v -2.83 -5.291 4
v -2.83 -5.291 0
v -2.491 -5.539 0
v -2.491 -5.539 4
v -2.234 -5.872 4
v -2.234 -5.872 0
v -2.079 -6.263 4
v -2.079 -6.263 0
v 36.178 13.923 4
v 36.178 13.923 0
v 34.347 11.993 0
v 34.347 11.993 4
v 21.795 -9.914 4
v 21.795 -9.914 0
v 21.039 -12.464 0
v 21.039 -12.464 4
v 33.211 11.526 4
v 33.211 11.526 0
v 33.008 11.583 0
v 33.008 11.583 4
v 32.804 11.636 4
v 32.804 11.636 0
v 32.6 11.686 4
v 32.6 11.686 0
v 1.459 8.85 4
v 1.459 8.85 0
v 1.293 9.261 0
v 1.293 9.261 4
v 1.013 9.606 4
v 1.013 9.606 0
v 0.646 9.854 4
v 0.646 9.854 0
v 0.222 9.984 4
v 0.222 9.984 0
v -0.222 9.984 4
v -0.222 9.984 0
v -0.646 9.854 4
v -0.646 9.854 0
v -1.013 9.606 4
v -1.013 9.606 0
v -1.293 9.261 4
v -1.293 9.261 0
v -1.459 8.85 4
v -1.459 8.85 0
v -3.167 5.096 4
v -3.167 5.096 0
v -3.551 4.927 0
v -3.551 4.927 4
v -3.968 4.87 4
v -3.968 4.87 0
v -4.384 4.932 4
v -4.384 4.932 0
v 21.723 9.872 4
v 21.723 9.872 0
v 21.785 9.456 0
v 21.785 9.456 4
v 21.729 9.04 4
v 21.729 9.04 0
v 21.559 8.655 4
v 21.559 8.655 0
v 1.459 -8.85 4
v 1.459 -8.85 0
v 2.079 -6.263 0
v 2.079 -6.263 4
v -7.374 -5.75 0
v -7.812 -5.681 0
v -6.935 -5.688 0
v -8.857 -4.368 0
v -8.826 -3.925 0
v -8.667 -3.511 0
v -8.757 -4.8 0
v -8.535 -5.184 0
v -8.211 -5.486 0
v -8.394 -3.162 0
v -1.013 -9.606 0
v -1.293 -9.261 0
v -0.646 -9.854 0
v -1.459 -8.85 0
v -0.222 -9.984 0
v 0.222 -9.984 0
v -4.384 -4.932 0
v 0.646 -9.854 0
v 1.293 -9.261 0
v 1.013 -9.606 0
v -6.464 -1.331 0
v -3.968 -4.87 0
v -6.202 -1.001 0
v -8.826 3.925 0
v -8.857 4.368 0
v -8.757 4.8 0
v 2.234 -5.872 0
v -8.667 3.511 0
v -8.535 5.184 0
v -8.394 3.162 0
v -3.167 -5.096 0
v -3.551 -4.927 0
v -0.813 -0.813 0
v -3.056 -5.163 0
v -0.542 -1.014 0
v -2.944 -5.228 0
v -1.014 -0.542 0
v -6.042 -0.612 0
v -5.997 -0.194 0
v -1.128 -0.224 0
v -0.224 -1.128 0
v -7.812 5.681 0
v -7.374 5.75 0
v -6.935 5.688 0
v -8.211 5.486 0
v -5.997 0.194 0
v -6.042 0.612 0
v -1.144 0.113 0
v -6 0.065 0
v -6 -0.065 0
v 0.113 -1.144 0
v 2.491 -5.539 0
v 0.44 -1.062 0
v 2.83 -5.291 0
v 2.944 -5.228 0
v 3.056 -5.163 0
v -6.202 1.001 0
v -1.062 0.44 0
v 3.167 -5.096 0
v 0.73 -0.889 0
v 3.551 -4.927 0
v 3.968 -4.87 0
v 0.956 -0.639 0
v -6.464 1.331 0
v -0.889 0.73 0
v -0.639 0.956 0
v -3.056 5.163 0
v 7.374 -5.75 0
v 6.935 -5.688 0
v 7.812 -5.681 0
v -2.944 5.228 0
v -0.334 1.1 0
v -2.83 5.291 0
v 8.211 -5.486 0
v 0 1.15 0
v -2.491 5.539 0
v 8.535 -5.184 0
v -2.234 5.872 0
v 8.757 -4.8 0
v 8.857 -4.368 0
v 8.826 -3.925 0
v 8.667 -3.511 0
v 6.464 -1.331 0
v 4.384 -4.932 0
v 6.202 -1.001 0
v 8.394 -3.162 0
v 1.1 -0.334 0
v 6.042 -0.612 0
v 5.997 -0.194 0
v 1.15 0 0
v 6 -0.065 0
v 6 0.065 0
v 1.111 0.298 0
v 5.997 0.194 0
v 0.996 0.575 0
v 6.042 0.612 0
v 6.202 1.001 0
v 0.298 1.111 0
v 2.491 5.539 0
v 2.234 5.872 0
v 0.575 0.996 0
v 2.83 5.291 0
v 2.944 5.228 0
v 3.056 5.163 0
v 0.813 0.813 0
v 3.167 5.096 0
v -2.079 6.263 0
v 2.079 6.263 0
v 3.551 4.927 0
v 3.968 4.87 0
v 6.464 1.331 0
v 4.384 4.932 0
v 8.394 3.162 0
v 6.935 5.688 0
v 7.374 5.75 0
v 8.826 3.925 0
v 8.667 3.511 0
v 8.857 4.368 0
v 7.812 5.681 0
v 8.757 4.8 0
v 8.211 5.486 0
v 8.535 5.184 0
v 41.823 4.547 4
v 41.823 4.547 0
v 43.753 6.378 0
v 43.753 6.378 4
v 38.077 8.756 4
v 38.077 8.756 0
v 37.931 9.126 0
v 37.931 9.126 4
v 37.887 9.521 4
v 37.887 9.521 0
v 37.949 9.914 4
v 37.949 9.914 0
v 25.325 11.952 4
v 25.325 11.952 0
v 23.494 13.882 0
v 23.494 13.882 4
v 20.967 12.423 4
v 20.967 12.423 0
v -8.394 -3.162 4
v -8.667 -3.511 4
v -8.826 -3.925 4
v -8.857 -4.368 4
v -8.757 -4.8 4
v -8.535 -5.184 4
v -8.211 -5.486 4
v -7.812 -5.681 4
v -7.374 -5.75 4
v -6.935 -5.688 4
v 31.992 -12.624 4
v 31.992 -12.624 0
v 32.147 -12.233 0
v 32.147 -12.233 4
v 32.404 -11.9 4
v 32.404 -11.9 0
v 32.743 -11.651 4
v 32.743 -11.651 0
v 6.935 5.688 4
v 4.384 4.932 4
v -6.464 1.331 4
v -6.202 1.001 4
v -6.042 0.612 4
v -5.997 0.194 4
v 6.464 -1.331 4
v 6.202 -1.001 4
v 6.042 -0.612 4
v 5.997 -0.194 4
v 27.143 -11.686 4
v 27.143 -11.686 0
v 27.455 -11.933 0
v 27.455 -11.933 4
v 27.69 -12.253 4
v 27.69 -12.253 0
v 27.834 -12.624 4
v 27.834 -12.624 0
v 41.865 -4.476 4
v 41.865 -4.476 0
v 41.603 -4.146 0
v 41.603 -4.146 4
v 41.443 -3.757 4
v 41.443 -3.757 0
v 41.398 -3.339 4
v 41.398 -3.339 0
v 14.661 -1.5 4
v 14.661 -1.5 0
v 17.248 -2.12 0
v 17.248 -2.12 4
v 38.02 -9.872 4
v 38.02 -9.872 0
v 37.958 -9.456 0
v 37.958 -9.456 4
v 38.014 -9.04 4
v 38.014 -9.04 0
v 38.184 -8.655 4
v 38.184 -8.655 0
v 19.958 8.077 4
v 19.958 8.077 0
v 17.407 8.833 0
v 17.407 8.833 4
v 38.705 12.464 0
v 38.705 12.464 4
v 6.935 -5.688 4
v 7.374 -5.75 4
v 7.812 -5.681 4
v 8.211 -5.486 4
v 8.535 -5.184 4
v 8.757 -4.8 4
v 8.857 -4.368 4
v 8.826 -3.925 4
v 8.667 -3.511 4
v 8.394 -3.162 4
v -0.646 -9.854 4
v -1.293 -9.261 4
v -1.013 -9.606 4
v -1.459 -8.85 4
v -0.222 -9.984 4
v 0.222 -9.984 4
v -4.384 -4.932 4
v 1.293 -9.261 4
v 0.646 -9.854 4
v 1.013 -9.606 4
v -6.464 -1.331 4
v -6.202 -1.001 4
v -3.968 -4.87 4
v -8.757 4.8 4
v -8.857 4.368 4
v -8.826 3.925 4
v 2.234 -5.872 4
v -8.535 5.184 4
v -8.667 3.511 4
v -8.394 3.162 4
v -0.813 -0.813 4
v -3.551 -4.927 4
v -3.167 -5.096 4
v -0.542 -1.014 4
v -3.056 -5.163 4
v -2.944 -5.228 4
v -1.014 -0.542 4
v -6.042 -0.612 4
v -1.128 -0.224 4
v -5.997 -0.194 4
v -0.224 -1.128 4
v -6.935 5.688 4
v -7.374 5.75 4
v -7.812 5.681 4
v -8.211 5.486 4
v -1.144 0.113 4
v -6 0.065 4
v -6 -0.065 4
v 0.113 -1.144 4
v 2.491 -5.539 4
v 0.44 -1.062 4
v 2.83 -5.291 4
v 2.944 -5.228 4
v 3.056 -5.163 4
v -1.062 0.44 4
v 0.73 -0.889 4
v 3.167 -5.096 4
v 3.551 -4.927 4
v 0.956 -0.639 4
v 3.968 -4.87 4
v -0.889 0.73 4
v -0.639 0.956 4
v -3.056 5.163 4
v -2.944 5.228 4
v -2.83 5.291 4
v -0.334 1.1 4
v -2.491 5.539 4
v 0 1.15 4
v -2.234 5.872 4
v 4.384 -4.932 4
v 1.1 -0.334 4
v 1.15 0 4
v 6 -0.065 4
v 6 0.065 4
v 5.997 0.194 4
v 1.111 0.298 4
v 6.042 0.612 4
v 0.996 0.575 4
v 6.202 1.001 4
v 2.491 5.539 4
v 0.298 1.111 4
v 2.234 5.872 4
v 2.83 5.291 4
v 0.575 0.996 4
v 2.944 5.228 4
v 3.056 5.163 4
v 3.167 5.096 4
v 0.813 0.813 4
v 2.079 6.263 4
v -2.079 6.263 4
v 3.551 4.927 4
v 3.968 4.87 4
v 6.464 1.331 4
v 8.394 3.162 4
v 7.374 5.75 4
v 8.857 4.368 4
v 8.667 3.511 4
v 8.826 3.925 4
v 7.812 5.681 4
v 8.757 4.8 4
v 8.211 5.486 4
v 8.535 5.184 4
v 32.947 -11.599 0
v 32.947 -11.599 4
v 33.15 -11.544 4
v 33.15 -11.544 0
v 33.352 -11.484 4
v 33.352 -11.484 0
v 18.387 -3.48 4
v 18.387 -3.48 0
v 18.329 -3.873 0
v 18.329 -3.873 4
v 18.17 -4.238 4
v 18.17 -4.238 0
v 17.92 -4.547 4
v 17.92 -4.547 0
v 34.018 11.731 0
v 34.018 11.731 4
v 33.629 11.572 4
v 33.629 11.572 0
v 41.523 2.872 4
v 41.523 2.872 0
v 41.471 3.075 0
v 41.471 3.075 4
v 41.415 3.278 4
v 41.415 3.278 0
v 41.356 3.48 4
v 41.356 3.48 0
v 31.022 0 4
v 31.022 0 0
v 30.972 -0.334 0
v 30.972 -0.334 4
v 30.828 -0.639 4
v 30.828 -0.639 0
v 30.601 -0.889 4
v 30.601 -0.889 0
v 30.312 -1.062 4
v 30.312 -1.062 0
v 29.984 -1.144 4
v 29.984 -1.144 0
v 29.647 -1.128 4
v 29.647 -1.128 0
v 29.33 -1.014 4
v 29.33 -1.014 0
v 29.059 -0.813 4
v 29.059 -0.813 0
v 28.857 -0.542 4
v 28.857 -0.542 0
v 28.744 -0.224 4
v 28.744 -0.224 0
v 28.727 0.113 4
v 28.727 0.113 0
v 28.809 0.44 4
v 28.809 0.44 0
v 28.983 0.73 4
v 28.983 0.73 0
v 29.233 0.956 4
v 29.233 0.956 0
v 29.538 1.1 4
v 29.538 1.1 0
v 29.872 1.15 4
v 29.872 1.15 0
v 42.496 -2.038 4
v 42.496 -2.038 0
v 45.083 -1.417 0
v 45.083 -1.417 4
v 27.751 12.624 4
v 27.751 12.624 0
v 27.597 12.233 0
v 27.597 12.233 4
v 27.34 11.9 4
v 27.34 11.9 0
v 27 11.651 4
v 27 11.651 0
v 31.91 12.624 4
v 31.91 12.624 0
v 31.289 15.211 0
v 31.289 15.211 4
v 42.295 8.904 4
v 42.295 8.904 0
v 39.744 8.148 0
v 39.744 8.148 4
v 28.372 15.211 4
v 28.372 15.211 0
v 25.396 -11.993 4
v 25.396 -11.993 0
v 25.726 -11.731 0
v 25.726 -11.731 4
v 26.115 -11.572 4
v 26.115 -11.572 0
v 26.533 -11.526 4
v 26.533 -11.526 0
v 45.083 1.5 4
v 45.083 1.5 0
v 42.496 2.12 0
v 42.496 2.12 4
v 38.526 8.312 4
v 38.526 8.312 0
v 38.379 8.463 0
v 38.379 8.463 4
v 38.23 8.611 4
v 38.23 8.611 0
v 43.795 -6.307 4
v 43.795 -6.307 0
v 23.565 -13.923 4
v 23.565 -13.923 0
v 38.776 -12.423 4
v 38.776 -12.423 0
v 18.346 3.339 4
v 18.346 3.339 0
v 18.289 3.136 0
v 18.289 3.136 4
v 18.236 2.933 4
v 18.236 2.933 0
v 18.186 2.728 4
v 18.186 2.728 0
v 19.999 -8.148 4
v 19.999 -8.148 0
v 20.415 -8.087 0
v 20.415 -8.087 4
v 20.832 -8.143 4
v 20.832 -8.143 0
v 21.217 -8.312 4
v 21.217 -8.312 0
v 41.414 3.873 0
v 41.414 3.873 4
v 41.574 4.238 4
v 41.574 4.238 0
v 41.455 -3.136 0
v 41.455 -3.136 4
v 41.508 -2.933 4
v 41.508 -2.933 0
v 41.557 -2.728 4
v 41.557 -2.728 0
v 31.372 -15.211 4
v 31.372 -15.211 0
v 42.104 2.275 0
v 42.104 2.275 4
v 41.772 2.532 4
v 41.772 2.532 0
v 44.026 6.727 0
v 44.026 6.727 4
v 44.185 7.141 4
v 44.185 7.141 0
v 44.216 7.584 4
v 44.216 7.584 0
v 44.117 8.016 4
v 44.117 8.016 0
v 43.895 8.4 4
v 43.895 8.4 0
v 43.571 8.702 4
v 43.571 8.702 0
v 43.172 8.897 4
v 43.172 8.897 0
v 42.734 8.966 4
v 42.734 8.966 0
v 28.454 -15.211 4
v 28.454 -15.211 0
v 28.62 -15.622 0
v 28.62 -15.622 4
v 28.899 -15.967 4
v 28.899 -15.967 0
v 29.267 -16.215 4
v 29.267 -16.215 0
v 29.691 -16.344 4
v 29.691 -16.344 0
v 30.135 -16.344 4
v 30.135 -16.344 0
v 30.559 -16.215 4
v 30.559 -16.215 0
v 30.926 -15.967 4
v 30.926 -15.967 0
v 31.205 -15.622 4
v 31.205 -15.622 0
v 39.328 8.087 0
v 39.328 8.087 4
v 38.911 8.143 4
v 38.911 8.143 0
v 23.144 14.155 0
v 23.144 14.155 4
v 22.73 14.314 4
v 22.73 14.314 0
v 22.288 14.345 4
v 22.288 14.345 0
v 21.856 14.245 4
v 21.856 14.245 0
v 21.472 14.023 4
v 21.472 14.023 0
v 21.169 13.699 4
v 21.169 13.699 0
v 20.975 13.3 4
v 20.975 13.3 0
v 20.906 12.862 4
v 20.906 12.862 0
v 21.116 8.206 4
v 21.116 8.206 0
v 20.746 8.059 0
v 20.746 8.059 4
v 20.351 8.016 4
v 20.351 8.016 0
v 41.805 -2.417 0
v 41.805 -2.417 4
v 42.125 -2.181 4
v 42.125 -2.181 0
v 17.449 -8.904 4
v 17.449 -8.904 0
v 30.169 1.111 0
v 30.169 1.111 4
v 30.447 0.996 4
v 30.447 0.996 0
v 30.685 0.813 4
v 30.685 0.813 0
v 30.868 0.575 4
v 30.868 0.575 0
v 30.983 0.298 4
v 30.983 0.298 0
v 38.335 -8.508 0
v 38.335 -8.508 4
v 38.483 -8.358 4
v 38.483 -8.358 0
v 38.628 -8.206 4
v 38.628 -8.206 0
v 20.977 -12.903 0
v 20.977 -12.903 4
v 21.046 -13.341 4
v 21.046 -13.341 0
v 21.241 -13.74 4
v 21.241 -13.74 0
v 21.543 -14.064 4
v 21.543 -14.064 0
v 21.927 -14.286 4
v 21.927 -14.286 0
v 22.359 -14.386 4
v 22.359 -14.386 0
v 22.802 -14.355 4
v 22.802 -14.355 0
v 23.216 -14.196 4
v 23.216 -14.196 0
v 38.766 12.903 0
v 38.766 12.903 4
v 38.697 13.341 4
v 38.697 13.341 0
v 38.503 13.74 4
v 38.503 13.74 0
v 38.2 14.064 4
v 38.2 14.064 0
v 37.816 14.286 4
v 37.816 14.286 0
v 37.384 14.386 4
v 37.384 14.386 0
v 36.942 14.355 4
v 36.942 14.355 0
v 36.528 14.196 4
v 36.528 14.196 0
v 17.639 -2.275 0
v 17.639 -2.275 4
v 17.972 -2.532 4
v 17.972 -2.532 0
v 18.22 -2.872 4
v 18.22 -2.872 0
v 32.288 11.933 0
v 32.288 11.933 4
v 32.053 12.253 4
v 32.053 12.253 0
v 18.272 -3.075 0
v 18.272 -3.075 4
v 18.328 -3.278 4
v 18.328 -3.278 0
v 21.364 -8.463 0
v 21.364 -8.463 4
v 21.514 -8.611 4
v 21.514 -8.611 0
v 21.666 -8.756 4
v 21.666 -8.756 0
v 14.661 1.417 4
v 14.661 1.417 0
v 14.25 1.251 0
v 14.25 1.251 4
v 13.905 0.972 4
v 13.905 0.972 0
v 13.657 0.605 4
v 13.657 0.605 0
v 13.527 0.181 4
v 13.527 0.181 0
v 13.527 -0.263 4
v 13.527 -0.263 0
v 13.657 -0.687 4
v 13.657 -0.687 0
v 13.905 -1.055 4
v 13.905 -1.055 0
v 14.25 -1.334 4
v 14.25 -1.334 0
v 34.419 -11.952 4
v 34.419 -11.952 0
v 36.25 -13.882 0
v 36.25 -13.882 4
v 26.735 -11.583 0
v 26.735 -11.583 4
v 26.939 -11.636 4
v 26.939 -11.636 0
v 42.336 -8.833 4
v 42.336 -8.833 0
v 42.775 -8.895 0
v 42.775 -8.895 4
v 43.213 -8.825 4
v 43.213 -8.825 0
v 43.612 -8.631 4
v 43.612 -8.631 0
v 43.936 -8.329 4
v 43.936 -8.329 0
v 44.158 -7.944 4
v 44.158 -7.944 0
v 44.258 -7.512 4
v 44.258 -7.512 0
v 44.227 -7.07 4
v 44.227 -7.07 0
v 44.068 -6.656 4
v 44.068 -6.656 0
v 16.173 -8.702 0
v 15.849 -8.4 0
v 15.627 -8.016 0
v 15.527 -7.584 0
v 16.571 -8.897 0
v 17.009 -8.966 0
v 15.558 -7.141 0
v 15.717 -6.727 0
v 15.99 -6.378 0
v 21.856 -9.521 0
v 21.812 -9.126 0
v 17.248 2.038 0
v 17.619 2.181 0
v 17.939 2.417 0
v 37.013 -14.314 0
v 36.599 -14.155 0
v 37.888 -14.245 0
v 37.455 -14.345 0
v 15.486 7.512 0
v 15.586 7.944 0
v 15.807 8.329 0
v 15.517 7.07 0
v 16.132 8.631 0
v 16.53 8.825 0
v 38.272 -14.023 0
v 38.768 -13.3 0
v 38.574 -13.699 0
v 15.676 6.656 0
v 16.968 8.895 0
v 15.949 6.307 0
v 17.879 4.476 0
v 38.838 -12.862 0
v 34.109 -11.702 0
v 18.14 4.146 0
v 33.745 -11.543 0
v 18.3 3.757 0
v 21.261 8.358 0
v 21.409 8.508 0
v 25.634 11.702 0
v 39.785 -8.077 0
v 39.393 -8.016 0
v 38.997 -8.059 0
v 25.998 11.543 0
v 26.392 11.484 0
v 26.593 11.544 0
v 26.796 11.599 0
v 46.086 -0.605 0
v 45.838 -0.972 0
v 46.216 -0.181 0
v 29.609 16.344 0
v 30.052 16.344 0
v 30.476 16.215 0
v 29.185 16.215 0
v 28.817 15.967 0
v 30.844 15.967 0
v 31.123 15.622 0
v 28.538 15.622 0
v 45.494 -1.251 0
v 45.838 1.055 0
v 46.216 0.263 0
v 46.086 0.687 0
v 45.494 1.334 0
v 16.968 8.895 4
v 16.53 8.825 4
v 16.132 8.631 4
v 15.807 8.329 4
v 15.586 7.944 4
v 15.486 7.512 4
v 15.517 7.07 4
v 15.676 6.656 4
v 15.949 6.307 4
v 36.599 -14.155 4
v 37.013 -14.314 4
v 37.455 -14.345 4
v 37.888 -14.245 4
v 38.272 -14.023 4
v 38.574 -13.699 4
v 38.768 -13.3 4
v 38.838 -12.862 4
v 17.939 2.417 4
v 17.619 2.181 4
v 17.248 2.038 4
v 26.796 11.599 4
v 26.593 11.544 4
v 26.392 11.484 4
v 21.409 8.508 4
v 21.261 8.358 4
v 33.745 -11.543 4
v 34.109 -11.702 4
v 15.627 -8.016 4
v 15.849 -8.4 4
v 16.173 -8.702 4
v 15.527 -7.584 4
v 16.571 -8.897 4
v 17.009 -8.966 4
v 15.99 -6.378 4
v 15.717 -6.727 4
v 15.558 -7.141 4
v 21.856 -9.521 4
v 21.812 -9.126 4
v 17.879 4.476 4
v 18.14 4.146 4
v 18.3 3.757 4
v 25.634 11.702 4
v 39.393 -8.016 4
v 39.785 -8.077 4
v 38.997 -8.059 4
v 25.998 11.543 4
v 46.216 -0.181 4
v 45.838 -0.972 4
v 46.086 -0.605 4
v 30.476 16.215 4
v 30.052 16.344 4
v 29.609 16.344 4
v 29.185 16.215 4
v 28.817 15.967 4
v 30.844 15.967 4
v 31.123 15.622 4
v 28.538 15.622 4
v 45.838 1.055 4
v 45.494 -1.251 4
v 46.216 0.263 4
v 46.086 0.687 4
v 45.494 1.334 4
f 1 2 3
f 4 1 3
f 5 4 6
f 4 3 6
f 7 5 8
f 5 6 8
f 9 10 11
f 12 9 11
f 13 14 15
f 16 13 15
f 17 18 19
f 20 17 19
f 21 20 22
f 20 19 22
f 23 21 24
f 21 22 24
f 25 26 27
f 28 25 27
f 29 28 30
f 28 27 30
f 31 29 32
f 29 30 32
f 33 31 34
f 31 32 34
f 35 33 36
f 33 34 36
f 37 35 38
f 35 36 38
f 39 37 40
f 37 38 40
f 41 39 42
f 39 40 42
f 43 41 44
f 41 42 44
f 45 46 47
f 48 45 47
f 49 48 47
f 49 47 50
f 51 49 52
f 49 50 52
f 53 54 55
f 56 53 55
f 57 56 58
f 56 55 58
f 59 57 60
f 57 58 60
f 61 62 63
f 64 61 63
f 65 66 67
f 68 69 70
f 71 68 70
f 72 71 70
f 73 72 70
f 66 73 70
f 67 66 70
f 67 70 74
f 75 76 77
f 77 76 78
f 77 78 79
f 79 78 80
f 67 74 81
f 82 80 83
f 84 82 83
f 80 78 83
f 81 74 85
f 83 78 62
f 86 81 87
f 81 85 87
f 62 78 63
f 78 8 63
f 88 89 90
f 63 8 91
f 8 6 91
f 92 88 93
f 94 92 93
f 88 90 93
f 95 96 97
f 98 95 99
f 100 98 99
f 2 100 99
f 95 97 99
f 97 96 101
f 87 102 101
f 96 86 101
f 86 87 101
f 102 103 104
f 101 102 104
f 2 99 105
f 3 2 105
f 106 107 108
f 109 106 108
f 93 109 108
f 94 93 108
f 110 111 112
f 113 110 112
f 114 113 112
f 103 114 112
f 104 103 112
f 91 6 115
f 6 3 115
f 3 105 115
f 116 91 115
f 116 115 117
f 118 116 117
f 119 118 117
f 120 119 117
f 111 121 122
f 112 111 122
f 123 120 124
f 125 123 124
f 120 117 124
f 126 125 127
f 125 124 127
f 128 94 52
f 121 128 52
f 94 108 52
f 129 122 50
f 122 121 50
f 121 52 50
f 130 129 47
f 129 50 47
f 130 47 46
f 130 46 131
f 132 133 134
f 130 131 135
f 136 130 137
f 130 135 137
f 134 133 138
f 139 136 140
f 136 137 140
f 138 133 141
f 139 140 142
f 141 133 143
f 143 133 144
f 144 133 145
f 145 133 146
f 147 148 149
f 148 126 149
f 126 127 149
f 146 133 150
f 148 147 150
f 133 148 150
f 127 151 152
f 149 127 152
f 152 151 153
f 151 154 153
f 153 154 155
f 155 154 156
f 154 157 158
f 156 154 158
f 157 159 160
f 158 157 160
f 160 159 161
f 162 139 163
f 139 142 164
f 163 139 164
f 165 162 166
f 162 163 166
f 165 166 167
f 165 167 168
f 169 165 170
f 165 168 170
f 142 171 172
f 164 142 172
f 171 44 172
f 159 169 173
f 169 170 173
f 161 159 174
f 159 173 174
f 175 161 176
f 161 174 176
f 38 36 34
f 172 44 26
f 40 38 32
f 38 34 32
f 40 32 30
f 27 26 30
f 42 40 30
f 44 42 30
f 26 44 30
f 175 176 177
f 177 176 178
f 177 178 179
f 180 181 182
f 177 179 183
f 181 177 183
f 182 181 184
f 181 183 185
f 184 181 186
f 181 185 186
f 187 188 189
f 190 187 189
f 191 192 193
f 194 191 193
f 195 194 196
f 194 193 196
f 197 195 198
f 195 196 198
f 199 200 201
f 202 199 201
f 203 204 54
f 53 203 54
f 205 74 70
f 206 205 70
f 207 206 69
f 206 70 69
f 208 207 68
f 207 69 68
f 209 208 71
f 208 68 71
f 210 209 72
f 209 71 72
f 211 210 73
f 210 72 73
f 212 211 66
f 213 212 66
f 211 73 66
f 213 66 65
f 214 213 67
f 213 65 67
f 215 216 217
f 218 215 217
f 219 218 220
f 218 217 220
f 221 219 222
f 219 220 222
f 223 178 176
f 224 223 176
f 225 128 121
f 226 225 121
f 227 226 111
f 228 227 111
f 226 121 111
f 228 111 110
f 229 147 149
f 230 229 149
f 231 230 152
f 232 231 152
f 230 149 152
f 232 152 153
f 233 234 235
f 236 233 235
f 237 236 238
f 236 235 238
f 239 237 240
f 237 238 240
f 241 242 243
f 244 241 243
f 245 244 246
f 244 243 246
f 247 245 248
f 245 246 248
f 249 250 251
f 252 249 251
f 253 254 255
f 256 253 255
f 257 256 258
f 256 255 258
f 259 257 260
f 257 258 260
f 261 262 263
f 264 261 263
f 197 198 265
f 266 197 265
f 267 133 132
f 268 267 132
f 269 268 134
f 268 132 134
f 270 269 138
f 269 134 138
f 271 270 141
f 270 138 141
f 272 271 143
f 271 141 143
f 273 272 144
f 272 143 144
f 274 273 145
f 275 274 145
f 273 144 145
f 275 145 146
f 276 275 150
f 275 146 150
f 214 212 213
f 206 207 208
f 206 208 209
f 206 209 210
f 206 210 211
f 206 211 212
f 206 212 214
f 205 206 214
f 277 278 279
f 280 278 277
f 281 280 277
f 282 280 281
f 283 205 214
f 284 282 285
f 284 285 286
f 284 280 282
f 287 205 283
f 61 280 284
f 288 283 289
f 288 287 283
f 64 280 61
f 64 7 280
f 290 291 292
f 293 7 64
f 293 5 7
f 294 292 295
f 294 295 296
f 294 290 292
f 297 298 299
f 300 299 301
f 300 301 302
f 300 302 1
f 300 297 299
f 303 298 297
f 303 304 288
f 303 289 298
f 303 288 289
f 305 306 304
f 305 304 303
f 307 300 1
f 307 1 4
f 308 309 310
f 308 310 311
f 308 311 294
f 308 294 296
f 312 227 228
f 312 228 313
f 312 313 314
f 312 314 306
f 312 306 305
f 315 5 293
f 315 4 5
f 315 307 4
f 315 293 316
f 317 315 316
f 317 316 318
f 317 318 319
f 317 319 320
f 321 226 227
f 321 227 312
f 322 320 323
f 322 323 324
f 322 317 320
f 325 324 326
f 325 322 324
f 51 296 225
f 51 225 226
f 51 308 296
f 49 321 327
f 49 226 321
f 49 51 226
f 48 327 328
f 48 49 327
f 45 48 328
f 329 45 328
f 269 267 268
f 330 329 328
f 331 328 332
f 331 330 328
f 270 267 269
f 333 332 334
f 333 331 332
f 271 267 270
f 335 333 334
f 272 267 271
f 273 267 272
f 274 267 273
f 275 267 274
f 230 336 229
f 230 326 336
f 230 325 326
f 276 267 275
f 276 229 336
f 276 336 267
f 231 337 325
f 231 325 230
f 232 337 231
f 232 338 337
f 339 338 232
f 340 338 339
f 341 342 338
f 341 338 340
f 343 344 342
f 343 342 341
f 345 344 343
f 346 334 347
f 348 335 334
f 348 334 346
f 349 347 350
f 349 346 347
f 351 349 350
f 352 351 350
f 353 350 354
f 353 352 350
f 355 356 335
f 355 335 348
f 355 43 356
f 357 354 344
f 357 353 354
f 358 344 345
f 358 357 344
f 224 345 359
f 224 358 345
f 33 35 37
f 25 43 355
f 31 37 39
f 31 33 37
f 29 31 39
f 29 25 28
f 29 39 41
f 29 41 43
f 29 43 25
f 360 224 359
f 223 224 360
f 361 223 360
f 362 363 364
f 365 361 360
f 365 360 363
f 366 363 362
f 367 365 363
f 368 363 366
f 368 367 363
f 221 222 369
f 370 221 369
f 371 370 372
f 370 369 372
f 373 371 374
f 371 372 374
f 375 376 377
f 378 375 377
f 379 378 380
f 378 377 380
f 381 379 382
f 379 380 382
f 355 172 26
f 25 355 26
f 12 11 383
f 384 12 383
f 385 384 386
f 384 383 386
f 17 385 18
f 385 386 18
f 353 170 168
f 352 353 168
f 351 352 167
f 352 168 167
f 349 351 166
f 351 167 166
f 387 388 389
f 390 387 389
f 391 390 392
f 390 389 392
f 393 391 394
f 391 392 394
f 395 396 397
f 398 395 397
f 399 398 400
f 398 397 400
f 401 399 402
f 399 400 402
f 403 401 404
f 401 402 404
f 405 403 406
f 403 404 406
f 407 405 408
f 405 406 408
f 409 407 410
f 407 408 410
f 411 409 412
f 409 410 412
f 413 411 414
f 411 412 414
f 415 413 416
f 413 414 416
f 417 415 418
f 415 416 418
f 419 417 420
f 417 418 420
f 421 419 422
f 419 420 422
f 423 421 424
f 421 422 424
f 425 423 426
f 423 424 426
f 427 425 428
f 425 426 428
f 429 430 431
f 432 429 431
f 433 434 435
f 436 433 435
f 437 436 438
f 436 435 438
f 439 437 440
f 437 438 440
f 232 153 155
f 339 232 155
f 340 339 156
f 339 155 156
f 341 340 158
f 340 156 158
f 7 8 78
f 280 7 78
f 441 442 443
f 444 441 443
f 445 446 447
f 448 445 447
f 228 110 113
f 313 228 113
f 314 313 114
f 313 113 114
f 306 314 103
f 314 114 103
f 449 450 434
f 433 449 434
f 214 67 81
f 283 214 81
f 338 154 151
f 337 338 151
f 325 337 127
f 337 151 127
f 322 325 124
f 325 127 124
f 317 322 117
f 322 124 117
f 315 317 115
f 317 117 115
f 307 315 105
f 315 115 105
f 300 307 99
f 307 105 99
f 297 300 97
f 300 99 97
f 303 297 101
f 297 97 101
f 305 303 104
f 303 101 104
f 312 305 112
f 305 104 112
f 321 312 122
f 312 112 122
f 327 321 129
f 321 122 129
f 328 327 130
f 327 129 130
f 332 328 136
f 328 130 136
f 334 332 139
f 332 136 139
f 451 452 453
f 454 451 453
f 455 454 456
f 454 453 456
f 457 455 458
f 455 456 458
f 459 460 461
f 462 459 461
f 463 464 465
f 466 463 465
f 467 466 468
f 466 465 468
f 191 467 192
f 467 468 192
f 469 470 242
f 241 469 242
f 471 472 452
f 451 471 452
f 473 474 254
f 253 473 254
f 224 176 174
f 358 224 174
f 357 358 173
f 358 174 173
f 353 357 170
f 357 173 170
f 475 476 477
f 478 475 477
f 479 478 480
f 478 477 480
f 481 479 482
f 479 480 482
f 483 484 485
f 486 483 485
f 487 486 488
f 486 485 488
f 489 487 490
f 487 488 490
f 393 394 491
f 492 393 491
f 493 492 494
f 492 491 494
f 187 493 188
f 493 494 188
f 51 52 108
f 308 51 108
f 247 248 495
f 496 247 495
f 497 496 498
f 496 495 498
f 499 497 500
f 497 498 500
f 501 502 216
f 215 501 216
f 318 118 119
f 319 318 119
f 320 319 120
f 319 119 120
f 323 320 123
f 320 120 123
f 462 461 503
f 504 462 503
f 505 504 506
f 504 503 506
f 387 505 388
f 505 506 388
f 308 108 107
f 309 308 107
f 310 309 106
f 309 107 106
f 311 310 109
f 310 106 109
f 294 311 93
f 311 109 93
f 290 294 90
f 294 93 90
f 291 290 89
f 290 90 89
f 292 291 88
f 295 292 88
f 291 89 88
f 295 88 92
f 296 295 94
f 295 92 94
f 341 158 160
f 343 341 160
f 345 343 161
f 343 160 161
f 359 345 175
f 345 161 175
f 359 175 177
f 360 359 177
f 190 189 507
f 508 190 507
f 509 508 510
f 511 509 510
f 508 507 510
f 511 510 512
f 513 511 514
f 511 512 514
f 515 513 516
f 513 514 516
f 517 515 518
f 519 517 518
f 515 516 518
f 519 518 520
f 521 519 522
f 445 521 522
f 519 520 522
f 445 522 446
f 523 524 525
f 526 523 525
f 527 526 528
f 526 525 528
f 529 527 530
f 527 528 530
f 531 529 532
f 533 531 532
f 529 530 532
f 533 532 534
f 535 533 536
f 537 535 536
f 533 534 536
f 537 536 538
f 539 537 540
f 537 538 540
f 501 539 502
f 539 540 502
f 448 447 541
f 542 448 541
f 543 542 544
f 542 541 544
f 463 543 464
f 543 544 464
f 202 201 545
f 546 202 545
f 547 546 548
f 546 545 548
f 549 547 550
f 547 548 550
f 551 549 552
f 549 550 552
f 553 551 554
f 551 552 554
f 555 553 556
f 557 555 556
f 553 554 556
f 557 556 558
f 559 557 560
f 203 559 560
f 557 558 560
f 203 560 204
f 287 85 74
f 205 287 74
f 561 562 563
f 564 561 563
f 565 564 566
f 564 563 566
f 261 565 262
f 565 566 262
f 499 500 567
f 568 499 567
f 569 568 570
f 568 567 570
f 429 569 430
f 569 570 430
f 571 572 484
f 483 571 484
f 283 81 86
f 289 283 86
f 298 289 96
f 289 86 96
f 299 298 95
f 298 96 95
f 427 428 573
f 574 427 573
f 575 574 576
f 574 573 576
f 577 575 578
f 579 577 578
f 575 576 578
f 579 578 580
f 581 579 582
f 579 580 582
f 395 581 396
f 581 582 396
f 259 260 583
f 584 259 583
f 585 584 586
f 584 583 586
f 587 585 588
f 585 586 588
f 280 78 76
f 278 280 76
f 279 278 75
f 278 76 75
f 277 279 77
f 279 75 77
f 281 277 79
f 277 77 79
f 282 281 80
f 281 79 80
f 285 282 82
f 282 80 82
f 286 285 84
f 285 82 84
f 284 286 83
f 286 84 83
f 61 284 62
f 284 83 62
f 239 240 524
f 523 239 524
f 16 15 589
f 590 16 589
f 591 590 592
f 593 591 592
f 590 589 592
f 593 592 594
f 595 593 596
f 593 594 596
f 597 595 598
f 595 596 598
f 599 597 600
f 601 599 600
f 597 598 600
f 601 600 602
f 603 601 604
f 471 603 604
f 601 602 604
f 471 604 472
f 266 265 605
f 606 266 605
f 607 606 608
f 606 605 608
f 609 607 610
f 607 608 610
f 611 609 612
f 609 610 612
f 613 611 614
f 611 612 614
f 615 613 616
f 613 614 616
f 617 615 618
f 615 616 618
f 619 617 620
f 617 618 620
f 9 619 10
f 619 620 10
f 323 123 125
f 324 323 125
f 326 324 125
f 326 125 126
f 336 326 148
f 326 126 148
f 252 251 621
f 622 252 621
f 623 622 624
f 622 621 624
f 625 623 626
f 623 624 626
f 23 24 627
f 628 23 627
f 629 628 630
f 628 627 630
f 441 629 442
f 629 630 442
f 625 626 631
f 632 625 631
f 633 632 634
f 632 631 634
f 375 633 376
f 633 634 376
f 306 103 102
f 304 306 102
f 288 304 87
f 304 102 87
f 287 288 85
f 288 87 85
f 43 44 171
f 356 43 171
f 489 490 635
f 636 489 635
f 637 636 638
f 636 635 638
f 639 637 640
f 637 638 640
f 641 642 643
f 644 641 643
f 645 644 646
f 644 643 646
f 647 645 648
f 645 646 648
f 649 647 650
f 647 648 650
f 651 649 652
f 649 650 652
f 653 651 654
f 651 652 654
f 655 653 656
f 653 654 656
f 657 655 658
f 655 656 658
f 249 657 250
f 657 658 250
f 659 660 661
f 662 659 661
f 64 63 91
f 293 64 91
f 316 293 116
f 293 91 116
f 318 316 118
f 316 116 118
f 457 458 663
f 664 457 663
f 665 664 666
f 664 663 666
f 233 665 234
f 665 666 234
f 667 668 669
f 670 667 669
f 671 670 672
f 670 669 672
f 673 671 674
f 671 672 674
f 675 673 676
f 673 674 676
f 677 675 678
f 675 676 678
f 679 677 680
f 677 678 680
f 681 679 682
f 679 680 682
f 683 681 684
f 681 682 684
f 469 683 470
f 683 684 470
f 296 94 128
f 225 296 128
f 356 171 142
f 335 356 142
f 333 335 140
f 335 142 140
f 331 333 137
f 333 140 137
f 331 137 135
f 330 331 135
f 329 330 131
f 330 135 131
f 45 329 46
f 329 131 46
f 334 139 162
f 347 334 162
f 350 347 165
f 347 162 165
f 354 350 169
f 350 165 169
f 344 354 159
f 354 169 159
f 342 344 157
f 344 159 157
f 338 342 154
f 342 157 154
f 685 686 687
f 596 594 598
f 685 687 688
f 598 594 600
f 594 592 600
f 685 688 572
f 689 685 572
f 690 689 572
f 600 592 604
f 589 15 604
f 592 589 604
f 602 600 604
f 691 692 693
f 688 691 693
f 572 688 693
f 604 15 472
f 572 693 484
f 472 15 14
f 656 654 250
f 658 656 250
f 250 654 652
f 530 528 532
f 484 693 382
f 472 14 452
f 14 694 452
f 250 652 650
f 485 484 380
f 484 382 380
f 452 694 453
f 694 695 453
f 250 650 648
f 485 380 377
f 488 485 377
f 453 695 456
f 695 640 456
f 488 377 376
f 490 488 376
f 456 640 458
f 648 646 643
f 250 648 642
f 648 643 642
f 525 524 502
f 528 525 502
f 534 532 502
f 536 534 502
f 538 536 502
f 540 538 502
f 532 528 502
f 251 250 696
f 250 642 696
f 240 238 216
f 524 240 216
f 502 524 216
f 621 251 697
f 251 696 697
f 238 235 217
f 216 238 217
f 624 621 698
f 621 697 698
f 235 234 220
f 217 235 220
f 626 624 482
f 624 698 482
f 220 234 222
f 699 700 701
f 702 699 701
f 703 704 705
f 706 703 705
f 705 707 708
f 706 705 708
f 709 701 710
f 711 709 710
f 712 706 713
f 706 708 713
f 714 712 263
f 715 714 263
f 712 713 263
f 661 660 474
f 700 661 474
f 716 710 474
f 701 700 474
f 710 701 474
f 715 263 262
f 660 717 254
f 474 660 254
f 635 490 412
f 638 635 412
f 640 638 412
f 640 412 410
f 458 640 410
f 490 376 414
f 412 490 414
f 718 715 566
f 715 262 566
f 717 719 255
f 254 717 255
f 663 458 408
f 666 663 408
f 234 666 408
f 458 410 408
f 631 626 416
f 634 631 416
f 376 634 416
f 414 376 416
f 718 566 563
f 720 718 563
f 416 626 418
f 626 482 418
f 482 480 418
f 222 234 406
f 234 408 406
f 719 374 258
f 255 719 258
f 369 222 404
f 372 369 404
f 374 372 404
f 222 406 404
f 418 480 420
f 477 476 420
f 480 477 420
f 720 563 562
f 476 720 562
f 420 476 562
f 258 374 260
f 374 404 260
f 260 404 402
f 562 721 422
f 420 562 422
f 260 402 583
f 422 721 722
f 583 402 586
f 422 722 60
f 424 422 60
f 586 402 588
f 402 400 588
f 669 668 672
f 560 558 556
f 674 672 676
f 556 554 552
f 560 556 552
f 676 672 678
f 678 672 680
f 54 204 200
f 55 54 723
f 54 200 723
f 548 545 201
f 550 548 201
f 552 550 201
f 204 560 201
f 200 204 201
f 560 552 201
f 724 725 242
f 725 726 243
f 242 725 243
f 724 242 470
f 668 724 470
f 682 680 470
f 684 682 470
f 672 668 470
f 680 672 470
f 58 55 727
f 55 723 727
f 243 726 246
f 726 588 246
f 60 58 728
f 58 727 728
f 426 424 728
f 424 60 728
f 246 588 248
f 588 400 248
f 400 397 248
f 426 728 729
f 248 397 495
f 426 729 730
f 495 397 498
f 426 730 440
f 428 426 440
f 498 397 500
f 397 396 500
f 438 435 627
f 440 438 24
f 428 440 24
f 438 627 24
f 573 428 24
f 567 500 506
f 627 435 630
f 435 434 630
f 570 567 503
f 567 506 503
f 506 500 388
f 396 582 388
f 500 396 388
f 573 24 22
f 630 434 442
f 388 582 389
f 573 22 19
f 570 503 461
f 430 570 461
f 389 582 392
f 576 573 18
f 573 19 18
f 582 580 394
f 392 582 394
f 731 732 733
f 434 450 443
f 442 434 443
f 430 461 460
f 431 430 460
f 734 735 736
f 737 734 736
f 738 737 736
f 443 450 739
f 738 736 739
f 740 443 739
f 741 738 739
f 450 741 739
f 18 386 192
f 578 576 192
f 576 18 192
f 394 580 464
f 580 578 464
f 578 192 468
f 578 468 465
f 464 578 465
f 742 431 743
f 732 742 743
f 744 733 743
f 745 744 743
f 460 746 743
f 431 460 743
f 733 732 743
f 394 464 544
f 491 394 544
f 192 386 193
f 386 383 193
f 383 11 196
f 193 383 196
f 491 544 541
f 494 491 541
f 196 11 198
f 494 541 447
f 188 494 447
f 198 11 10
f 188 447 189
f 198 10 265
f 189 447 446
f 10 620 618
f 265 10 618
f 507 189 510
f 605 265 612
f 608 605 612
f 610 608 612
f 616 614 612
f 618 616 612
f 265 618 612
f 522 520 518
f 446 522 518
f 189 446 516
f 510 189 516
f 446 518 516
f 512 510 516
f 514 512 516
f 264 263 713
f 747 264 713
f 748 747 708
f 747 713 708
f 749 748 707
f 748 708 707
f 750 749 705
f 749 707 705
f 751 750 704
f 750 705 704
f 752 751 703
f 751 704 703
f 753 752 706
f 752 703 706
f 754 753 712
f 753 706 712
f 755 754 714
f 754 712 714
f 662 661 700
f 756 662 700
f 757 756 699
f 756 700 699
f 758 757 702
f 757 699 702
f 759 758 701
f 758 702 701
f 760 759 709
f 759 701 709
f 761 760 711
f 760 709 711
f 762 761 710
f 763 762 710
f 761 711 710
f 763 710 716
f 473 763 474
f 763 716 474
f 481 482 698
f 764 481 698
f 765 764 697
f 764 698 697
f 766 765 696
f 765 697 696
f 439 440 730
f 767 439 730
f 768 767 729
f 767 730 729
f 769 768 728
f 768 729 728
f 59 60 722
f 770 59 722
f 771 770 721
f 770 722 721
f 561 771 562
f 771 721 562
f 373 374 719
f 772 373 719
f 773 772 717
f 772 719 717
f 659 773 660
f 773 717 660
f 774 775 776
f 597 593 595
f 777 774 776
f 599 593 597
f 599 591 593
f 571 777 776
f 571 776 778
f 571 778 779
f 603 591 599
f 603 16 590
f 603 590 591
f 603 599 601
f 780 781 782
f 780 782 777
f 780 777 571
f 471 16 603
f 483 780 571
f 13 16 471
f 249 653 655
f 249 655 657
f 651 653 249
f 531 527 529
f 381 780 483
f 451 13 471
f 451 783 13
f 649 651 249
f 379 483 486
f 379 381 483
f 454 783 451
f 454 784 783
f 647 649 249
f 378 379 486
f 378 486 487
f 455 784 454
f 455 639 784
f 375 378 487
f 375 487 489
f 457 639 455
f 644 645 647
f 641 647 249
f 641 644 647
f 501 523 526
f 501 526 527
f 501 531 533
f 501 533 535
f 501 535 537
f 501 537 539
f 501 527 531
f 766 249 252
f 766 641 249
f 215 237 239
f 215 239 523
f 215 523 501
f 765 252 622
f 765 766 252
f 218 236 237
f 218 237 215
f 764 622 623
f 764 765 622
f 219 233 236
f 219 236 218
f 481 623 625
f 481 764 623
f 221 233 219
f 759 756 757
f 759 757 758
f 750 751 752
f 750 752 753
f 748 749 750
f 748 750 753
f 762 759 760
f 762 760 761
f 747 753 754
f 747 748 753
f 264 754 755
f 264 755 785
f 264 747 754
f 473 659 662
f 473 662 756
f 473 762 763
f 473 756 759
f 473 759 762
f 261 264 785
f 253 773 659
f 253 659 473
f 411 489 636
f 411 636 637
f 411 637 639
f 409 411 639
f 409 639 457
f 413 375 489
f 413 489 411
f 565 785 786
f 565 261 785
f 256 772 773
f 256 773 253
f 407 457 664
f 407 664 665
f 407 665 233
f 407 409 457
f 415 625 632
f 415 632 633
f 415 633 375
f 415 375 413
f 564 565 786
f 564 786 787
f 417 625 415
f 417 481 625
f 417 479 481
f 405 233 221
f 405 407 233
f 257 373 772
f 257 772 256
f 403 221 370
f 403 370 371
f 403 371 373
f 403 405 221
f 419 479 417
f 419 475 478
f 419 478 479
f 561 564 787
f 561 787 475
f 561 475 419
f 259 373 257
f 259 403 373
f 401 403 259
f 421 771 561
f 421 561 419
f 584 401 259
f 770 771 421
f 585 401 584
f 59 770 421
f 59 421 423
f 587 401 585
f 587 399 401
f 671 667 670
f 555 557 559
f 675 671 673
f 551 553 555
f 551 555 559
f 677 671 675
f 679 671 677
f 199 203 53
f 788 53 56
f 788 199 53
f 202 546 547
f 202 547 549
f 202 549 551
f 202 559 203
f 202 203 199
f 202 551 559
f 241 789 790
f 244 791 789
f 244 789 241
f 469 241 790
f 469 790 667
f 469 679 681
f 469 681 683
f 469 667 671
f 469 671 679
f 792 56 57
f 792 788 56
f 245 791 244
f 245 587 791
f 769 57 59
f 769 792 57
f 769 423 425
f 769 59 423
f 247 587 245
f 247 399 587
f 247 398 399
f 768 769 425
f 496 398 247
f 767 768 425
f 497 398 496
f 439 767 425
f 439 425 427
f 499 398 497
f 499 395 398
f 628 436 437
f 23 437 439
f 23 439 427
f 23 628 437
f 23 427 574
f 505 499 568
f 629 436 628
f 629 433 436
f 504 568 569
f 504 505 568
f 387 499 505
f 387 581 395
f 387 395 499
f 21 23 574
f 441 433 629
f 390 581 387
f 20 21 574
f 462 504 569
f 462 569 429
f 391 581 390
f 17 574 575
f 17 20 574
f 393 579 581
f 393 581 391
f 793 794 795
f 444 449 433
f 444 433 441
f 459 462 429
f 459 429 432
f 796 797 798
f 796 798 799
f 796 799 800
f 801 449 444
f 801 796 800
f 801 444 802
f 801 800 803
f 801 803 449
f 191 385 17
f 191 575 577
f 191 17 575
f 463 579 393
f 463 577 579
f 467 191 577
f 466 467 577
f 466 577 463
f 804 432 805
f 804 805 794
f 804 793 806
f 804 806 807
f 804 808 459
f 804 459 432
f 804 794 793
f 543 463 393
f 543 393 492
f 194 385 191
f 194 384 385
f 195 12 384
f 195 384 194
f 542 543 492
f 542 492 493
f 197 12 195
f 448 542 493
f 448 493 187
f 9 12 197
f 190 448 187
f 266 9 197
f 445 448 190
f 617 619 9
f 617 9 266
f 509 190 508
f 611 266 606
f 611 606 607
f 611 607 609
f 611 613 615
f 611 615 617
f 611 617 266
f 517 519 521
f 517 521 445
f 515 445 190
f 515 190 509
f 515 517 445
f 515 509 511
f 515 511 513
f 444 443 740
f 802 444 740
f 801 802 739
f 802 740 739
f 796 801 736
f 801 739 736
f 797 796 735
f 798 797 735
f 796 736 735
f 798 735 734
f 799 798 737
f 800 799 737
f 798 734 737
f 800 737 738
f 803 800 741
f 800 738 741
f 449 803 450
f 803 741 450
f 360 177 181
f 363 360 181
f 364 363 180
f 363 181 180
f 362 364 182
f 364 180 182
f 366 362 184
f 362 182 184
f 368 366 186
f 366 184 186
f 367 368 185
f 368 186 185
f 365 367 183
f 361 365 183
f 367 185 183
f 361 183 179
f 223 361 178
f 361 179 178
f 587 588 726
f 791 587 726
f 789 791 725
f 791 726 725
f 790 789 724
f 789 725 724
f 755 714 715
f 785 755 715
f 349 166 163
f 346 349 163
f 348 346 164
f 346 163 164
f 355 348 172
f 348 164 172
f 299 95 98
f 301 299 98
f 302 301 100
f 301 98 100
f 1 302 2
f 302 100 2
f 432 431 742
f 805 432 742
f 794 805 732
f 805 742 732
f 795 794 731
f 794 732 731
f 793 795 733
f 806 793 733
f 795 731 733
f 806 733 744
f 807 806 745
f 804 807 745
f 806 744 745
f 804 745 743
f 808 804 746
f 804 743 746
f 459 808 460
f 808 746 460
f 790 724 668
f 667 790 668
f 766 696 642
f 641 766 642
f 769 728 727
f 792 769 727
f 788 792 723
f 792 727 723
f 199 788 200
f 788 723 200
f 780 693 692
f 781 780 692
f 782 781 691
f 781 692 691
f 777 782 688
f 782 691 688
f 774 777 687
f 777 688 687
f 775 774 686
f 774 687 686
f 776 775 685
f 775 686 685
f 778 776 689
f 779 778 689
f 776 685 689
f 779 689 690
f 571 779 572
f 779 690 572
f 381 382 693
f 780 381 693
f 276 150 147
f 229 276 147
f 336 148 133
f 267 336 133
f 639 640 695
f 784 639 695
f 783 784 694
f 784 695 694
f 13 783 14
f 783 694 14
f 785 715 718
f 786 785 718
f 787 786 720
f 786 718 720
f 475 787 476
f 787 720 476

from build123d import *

# Parameters (mm, degrees)
F1_DEPTH = 4
F3_DEPTH = 4


with BuildPart() as f1:
    # F0 (on Top) → F1 (new body)
    with BuildSketch(Plane.XY):
        with BuildLine():
            ThreePointArc((-2.079262, 6.263165), (-2.350601, 5.696396), (-2.830292, 5.290505))
            ThreePointArc((-2.830292, 5.290505), (-3, 5.196152), (-3.166566, 5.096358))
            ThreePointArc((-3.166566, 5.096358), (-3.757923, 4.883878), (-4.384429, 4.932276))
            Line((-4.384429, 4.932276), (-6.934995, 5.688171))
            ThreePointArc((-6.934995, 5.688171), (-8.660254, 5), (-8.393598, 3.161796))
            Line((-8.393598, 3.161796), (-6.463691, 1.330888))
            ThreePointArc((-6.463691, 1.330888), (-6.108524, 0.812518), (-5.996858, 0.194148))
            ThreePointArc((-5.996858, 0.194148), (-6, 0), (-5.996858, -0.194148))
            ThreePointArc((-5.996858, -0.194148), (-6.108524, -0.812518), (-6.463691, -1.330888))
            Line((-6.463691, -1.330888), (-8.393598, -3.161796))
            ThreePointArc((-8.393598, -3.161796), (-8.660254, -5), (-6.934995, -5.688171))
            Line((-6.934995, -5.688171), (-4.384429, -4.932276))
            ThreePointArc((-4.384429, -4.932276), (-3.757923, -4.883878), (-3.166566, -5.096358))
            ThreePointArc((-3.166566, -5.096358), (-3, -5.196152), (-2.830292, -5.290505))
            ThreePointArc((-2.830292, -5.290505), (-2.350601, -5.696396), (-2.079262, -6.263165))
            Line((-2.079262, -6.263165), (-1.458603, -8.849967))
            ThreePointArc((-1.458603, -8.849967), (0, -10), (1.458603, -8.849967))
            Line((1.458603, -8.849967), (2.079262, -6.263165))
            ThreePointArc((2.079262, -6.263165), (2.350601, -5.696396), (2.830292, -5.290505))
            ThreePointArc((2.830292, -5.290505), (3, -5.196152), (3.166566, -5.096358))
            ThreePointArc((3.166566, -5.096358), (3.757923, -4.883878), (4.384429, -4.932276))
            Line((4.384429, -4.932276), (6.934995, -5.688171))
            ThreePointArc((6.934995, -5.688171), (8.660254, -5), (8.393598, -3.161796))
            Line((8.393598, -3.161796), (6.463691, -1.330888))
            ThreePointArc((6.463691, -1.330888), (6.108524, -0.812518), (5.996858, -0.194148))
            ThreePointArc((5.996858, -0.194148), (6, 0), (5.996858, 0.194148))
            ThreePointArc((5.996858, 0.194148), (6.108524, 0.812518), (6.463691, 1.330888))
            Line((6.463691, 1.330888), (8.393598, 3.161796))
            ThreePointArc((8.393598, 3.161796), (8.660254, 5), (6.934995, 5.688171))
            Line((6.934995, 5.688171), (4.384429, 4.932276))
            ThreePointArc((4.384429, 4.932276), (3.757923, 4.883878), (3.166566, 5.096358))
            ThreePointArc((3.166566, 5.096358), (3, 5.196152), (2.830292, 5.290505))
            ThreePointArc((2.830292, 5.290505), (2.350601, 5.696396), (2.079262, 6.263165))
            Line((2.079262, 6.263165), (1.458603, 8.849967))
            ThreePointArc((1.458603, 8.849967), (0, 10), (-1.458603, 8.849967))
            Line((-1.458603, 8.849967), (-2.079262, 6.263165))
        make_face()
        with BuildLine():
            ThreePointArc((0, 1.15), (0.813173, 0.813173), (1.15, 0))
            ThreePointArc((1.15, 0), (-0.813173, -0.813173), (0, 1.15))
        make_face(mode=Mode.SUBTRACT)
    extrude(amount=F1_DEPTH)


with BuildPart() as f3:
    # F2 (on Top) → F3 (new body)
    with BuildSketch(Plane.XY):
        with BuildLine():
            ThreePointArc((27.751199, 12.624026), (27.47986, 12.057258), (27.000169, 11.651367))
            ThreePointArc((27.000169, 11.651367), (26.69476, 11.571823), (26.391548, 11.484276))
            ThreePointArc((26.391548, 11.484276), (25.810879, 11.610222), (25.324666, 11.951743))
            Line((25.324666, 11.951743), (23.493758, 13.88165))
            ThreePointArc((23.493758, 13.88165), (21.655554, 14.148306), (20.967383, 12.423046))
            Line((20.967383, 12.423046), (21.723278, 9.87248))
            ThreePointArc((21.723278, 9.87248), (21.771676, 9.245975), (21.559197, 8.654618))
            ThreePointArc((21.559197, 8.654618), (21.334476, 8.433026), (21.115661, 8.205602))
            ThreePointArc((21.115661, 8.205602), (20.549814, 8.02434), (19.957981, 8.076999))
            Line((19.957981, 8.076999), (17.407415, 8.832894))
            ThreePointArc((17.407415, 8.832894), (15.682155, 8.144723), (15.948811, 6.306519))
            Line((15.948811, 6.306519), (17.878718, 4.475611))
            ThreePointArc((17.878718, 4.475611), (18.233885, 3.957241), (18.345551, 3.33887))
            ThreePointArc((18.345551, 3.33887), (18.261733, 3.034607), (18.185946, 2.728244))
            ThreePointArc((18.185946, 2.728244), (17.786539, 2.288343), (17.247667, 2.03803))
            Line((17.247667, 2.03803), (14.660864, 1.417371))
            ThreePointArc((14.660864, 1.417371), (13.510831, -0.041232), (14.660864, -1.499835))
            Line((14.660864, -1.499835), (17.247667, -2.120494))
            ThreePointArc((17.247667, -2.120494), (17.814435, -2.391833), (18.220326, -2.871524))
            ThreePointArc((18.220326, -2.871524), (18.29987, -3.176933), (18.387417, -3.480145))
            ThreePointArc((18.387417, -3.480145), (18.261471, -4.060814), (17.91995, -4.547027))
            Line((17.91995, -4.547027), (15.990043, -6.377935))
            ThreePointArc((15.990043, -6.377935), (15.723387, -8.216139), (17.448646, -8.90431))
            Line((17.448646, -8.90431), (19.999213, -8.148415))
            ThreePointArc((19.999213, -8.148415), (20.625718, -8.100017), (21.217075, -8.312496))
            ThreePointArc((21.217075, -8.312496), (21.438666, -8.537216), (21.666091, -8.756032))
            ThreePointArc((21.666091, -8.756032), (21.847352, -9.321879), (21.794694, -9.913712))
            Line((21.794694, -9.913712), (21.038799, -12.464278))
            ThreePointArc((21.038799, -12.464278), (21.72697, -14.189538), (23.565174, -13.922881))
            Line((23.565174, -13.922881), (25.396082, -11.992974))
            ThreePointArc((25.396082, -11.992974), (25.914452, -11.637808), (26.532822, -11.526142))
            ThreePointArc((26.532822, -11.526142), (26.837086, -11.60996), (27.143449, -11.685747))
            ThreePointArc((27.143449, -11.685747), (27.58335, -12.085154), (27.833663, -12.624026))
            Line((27.833663, -12.624026), (28.454322, -15.210829))
            ThreePointArc((28.454322, -15.210829), (29.912925, -16.360862), (31.371528, -15.210829))
            Line((31.371528, -15.210829), (31.992187, -12.624026))
            ThreePointArc((31.992187, -12.624026), (32.263526, -12.057258), (32.743217, -11.651367))
            ThreePointArc((32.743217, -11.651367), (33.048626, -11.571823), (33.351838, -11.484276))
            ThreePointArc((33.351838, -11.484276), (33.932507, -11.610222), (34.41872, -11.951743))
            Line((34.41872, -11.951743), (36.249628, -13.88165))
            ThreePointArc((36.249628, -13.88165), (38.087832, -14.148306), (38.776002, -12.423046))
            Line((38.776002, -12.423046), (38.020108, -9.87248))
            ThreePointArc((38.020108, -9.87248), (37.97171, -9.245975), (38.184189, -8.654618))
            ThreePointArc((38.184189, -8.654618), (38.408909, -8.433026), (38.627725, -8.205602))
            ThreePointArc((38.627725, -8.205602), (39.193572, -8.02434), (39.785405, -8.076999))
            Line((39.785405, -8.076999), (42.335971, -8.832894))
            ThreePointArc((42.335971, -8.832894), (44.061231, -8.144723), (43.794574, -6.306519))
            Line((43.794574, -6.306519), (41.864667, -4.475611))
            ThreePointArc((41.864667, -4.475611), (41.509501, -3.957241), (41.397835, -3.33887))
            ThreePointArc((41.397835, -3.33887), (41.481652, -3.034607), (41.55744, -2.728244))
            ThreePointArc((41.55744, -2.728244), (41.956847, -2.288343), (42.495719, -2.03803))
            Line((42.495719, -2.03803), (45.082521, -1.417371))
            ThreePointArc((45.082521, -1.417371), (46.232554, 0.041232), (45.082521, 1.499835))
            Line((45.082521, 1.499835), (42.495719, 2.120494))
            ThreePointArc((42.495719, 2.120494), (41.928951, 2.391833), (41.52306, 2.871524))
            ThreePointArc((41.52306, 2.871524), (41.443516, 3.176933), (41.355969, 3.480145))
            ThreePointArc((41.355969, 3.480145), (41.481915, 4.060814), (41.823435, 4.547027))
            Line((41.823435, 4.547027), (43.753342, 6.377935))
            ThreePointArc((43.753342, 6.377935), (44.019999, 8.216139), (42.294739, 8.90431))
            Line((42.294739, 8.90431), (39.744173, 8.148415))
            ThreePointArc((39.744173, 8.148415), (39.117668, 8.100017), (38.52631, 8.312496))
            ThreePointArc((38.52631, 8.312496), (38.304719, 8.537216), (38.077295, 8.756032))
            ThreePointArc((38.077295, 8.756032), (37.896033, 9.321879), (37.948692, 9.913712))
            Line((37.948692, 9.913712), (38.704587, 12.464278))
            ThreePointArc((38.704587, 12.464278), (38.016416, 14.189538), (36.178212, 13.922881))
            Line((36.178212, 13.922881), (34.347304, 11.992974))
            ThreePointArc((34.347304, 11.992974), (33.828934, 11.637808), (33.210563, 11.526142))
            ThreePointArc((33.210563, 11.526142), (32.9063, 11.60996), (32.599937, 11.685747))
            ThreePointArc((32.599937, 11.685747), (32.160036, 12.085154), (31.909723, 12.624026))
            Line((31.909723, 12.624026), (31.289064, 15.210829))
            ThreePointArc((31.289064, 15.210829), (29.830461, 16.360862), (28.371858, 15.210829))
            Line((28.371858, 15.210829), (27.751199, 12.624026))
        make_face()
        with BuildLine():
            ThreePointArc((29.871693, 1.15), (30.684866, 0.813173), (31.021693, 0))
            ThreePointArc((31.021693, 0), (29.05852, -0.813173), (29.871693, 1.15))
        make_face(mode=Mode.SUBTRACT)
    extrude(amount=F3_DEPTH)


solid = Compound([f1.part, f3.part])
